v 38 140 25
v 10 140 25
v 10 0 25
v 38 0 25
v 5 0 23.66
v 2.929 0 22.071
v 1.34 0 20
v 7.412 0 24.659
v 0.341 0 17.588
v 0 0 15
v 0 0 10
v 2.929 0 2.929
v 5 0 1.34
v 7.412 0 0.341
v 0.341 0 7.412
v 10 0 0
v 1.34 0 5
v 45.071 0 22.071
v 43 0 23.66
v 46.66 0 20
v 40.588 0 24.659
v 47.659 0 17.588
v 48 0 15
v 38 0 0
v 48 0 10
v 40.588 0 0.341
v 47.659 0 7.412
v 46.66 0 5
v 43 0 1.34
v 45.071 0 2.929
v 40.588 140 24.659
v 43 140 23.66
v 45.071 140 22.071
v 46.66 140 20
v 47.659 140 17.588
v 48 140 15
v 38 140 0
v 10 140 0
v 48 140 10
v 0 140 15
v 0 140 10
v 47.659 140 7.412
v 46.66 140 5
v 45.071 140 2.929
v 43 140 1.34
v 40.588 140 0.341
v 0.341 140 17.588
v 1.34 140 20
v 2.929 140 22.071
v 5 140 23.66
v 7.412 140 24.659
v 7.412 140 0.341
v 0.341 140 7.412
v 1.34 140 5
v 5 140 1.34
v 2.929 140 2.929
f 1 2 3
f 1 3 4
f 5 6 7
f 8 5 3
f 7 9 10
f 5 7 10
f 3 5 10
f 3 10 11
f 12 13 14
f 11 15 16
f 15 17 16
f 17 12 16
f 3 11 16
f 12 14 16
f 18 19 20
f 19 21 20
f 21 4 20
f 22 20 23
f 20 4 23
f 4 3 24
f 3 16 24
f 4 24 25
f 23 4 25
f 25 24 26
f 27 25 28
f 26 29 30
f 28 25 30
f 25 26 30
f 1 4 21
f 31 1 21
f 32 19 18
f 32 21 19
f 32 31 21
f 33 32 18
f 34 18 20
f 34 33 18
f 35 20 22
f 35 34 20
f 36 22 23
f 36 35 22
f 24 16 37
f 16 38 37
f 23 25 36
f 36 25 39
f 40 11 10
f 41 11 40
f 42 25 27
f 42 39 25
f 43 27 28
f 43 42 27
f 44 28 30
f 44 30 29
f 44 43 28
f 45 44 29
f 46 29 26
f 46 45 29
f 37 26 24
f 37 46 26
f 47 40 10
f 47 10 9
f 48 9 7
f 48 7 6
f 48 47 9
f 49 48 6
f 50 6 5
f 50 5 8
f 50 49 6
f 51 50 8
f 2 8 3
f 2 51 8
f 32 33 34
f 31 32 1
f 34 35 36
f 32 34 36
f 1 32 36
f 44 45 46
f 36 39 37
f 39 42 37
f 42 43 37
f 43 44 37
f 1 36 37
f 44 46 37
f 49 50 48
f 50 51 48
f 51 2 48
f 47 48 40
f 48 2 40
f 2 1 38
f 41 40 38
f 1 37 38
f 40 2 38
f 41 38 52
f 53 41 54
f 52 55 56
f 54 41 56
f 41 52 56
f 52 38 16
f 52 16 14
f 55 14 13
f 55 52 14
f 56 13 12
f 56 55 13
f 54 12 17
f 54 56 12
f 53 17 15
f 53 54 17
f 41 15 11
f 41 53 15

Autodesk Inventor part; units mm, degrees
ref_plane "YZ Plane" through (0, 0, 0) normal (1, 0, 0) x (0, 1, 0)
ref_plane "XZ Plane" through (0, 0, 0) normal (0, 1, 0) x (-1, 0, 0)
ref_plane "XY Plane" through (0, 0, 0) normal (0, 0, 1) x (1, 0, 0)
sketch "スケッチ1" plane through (0, 0, 0) normal (0, 0, 1) x (1, 0, 0)
  line L0 (0, 0) -> (0, 140)
  line L1 (0, 140) -> (0, 0)
  line L2 (0, 0) -> (48, 0)
  line L3 (48, 0) -> (48, 140)
  line L4 (48, 140) -> (0, 140)
  dimension "d0" = 140
  dimension "d1" = 48
extrude "押し出し1" add sketch "スケッチ1" along normal blind 25
fillet "フィレット1" radius 10 4 edges at (48, 70, 25) (48, 70, 0) (0, 70, 25) (0, 70, 0)
properties part number "バッテリー"
